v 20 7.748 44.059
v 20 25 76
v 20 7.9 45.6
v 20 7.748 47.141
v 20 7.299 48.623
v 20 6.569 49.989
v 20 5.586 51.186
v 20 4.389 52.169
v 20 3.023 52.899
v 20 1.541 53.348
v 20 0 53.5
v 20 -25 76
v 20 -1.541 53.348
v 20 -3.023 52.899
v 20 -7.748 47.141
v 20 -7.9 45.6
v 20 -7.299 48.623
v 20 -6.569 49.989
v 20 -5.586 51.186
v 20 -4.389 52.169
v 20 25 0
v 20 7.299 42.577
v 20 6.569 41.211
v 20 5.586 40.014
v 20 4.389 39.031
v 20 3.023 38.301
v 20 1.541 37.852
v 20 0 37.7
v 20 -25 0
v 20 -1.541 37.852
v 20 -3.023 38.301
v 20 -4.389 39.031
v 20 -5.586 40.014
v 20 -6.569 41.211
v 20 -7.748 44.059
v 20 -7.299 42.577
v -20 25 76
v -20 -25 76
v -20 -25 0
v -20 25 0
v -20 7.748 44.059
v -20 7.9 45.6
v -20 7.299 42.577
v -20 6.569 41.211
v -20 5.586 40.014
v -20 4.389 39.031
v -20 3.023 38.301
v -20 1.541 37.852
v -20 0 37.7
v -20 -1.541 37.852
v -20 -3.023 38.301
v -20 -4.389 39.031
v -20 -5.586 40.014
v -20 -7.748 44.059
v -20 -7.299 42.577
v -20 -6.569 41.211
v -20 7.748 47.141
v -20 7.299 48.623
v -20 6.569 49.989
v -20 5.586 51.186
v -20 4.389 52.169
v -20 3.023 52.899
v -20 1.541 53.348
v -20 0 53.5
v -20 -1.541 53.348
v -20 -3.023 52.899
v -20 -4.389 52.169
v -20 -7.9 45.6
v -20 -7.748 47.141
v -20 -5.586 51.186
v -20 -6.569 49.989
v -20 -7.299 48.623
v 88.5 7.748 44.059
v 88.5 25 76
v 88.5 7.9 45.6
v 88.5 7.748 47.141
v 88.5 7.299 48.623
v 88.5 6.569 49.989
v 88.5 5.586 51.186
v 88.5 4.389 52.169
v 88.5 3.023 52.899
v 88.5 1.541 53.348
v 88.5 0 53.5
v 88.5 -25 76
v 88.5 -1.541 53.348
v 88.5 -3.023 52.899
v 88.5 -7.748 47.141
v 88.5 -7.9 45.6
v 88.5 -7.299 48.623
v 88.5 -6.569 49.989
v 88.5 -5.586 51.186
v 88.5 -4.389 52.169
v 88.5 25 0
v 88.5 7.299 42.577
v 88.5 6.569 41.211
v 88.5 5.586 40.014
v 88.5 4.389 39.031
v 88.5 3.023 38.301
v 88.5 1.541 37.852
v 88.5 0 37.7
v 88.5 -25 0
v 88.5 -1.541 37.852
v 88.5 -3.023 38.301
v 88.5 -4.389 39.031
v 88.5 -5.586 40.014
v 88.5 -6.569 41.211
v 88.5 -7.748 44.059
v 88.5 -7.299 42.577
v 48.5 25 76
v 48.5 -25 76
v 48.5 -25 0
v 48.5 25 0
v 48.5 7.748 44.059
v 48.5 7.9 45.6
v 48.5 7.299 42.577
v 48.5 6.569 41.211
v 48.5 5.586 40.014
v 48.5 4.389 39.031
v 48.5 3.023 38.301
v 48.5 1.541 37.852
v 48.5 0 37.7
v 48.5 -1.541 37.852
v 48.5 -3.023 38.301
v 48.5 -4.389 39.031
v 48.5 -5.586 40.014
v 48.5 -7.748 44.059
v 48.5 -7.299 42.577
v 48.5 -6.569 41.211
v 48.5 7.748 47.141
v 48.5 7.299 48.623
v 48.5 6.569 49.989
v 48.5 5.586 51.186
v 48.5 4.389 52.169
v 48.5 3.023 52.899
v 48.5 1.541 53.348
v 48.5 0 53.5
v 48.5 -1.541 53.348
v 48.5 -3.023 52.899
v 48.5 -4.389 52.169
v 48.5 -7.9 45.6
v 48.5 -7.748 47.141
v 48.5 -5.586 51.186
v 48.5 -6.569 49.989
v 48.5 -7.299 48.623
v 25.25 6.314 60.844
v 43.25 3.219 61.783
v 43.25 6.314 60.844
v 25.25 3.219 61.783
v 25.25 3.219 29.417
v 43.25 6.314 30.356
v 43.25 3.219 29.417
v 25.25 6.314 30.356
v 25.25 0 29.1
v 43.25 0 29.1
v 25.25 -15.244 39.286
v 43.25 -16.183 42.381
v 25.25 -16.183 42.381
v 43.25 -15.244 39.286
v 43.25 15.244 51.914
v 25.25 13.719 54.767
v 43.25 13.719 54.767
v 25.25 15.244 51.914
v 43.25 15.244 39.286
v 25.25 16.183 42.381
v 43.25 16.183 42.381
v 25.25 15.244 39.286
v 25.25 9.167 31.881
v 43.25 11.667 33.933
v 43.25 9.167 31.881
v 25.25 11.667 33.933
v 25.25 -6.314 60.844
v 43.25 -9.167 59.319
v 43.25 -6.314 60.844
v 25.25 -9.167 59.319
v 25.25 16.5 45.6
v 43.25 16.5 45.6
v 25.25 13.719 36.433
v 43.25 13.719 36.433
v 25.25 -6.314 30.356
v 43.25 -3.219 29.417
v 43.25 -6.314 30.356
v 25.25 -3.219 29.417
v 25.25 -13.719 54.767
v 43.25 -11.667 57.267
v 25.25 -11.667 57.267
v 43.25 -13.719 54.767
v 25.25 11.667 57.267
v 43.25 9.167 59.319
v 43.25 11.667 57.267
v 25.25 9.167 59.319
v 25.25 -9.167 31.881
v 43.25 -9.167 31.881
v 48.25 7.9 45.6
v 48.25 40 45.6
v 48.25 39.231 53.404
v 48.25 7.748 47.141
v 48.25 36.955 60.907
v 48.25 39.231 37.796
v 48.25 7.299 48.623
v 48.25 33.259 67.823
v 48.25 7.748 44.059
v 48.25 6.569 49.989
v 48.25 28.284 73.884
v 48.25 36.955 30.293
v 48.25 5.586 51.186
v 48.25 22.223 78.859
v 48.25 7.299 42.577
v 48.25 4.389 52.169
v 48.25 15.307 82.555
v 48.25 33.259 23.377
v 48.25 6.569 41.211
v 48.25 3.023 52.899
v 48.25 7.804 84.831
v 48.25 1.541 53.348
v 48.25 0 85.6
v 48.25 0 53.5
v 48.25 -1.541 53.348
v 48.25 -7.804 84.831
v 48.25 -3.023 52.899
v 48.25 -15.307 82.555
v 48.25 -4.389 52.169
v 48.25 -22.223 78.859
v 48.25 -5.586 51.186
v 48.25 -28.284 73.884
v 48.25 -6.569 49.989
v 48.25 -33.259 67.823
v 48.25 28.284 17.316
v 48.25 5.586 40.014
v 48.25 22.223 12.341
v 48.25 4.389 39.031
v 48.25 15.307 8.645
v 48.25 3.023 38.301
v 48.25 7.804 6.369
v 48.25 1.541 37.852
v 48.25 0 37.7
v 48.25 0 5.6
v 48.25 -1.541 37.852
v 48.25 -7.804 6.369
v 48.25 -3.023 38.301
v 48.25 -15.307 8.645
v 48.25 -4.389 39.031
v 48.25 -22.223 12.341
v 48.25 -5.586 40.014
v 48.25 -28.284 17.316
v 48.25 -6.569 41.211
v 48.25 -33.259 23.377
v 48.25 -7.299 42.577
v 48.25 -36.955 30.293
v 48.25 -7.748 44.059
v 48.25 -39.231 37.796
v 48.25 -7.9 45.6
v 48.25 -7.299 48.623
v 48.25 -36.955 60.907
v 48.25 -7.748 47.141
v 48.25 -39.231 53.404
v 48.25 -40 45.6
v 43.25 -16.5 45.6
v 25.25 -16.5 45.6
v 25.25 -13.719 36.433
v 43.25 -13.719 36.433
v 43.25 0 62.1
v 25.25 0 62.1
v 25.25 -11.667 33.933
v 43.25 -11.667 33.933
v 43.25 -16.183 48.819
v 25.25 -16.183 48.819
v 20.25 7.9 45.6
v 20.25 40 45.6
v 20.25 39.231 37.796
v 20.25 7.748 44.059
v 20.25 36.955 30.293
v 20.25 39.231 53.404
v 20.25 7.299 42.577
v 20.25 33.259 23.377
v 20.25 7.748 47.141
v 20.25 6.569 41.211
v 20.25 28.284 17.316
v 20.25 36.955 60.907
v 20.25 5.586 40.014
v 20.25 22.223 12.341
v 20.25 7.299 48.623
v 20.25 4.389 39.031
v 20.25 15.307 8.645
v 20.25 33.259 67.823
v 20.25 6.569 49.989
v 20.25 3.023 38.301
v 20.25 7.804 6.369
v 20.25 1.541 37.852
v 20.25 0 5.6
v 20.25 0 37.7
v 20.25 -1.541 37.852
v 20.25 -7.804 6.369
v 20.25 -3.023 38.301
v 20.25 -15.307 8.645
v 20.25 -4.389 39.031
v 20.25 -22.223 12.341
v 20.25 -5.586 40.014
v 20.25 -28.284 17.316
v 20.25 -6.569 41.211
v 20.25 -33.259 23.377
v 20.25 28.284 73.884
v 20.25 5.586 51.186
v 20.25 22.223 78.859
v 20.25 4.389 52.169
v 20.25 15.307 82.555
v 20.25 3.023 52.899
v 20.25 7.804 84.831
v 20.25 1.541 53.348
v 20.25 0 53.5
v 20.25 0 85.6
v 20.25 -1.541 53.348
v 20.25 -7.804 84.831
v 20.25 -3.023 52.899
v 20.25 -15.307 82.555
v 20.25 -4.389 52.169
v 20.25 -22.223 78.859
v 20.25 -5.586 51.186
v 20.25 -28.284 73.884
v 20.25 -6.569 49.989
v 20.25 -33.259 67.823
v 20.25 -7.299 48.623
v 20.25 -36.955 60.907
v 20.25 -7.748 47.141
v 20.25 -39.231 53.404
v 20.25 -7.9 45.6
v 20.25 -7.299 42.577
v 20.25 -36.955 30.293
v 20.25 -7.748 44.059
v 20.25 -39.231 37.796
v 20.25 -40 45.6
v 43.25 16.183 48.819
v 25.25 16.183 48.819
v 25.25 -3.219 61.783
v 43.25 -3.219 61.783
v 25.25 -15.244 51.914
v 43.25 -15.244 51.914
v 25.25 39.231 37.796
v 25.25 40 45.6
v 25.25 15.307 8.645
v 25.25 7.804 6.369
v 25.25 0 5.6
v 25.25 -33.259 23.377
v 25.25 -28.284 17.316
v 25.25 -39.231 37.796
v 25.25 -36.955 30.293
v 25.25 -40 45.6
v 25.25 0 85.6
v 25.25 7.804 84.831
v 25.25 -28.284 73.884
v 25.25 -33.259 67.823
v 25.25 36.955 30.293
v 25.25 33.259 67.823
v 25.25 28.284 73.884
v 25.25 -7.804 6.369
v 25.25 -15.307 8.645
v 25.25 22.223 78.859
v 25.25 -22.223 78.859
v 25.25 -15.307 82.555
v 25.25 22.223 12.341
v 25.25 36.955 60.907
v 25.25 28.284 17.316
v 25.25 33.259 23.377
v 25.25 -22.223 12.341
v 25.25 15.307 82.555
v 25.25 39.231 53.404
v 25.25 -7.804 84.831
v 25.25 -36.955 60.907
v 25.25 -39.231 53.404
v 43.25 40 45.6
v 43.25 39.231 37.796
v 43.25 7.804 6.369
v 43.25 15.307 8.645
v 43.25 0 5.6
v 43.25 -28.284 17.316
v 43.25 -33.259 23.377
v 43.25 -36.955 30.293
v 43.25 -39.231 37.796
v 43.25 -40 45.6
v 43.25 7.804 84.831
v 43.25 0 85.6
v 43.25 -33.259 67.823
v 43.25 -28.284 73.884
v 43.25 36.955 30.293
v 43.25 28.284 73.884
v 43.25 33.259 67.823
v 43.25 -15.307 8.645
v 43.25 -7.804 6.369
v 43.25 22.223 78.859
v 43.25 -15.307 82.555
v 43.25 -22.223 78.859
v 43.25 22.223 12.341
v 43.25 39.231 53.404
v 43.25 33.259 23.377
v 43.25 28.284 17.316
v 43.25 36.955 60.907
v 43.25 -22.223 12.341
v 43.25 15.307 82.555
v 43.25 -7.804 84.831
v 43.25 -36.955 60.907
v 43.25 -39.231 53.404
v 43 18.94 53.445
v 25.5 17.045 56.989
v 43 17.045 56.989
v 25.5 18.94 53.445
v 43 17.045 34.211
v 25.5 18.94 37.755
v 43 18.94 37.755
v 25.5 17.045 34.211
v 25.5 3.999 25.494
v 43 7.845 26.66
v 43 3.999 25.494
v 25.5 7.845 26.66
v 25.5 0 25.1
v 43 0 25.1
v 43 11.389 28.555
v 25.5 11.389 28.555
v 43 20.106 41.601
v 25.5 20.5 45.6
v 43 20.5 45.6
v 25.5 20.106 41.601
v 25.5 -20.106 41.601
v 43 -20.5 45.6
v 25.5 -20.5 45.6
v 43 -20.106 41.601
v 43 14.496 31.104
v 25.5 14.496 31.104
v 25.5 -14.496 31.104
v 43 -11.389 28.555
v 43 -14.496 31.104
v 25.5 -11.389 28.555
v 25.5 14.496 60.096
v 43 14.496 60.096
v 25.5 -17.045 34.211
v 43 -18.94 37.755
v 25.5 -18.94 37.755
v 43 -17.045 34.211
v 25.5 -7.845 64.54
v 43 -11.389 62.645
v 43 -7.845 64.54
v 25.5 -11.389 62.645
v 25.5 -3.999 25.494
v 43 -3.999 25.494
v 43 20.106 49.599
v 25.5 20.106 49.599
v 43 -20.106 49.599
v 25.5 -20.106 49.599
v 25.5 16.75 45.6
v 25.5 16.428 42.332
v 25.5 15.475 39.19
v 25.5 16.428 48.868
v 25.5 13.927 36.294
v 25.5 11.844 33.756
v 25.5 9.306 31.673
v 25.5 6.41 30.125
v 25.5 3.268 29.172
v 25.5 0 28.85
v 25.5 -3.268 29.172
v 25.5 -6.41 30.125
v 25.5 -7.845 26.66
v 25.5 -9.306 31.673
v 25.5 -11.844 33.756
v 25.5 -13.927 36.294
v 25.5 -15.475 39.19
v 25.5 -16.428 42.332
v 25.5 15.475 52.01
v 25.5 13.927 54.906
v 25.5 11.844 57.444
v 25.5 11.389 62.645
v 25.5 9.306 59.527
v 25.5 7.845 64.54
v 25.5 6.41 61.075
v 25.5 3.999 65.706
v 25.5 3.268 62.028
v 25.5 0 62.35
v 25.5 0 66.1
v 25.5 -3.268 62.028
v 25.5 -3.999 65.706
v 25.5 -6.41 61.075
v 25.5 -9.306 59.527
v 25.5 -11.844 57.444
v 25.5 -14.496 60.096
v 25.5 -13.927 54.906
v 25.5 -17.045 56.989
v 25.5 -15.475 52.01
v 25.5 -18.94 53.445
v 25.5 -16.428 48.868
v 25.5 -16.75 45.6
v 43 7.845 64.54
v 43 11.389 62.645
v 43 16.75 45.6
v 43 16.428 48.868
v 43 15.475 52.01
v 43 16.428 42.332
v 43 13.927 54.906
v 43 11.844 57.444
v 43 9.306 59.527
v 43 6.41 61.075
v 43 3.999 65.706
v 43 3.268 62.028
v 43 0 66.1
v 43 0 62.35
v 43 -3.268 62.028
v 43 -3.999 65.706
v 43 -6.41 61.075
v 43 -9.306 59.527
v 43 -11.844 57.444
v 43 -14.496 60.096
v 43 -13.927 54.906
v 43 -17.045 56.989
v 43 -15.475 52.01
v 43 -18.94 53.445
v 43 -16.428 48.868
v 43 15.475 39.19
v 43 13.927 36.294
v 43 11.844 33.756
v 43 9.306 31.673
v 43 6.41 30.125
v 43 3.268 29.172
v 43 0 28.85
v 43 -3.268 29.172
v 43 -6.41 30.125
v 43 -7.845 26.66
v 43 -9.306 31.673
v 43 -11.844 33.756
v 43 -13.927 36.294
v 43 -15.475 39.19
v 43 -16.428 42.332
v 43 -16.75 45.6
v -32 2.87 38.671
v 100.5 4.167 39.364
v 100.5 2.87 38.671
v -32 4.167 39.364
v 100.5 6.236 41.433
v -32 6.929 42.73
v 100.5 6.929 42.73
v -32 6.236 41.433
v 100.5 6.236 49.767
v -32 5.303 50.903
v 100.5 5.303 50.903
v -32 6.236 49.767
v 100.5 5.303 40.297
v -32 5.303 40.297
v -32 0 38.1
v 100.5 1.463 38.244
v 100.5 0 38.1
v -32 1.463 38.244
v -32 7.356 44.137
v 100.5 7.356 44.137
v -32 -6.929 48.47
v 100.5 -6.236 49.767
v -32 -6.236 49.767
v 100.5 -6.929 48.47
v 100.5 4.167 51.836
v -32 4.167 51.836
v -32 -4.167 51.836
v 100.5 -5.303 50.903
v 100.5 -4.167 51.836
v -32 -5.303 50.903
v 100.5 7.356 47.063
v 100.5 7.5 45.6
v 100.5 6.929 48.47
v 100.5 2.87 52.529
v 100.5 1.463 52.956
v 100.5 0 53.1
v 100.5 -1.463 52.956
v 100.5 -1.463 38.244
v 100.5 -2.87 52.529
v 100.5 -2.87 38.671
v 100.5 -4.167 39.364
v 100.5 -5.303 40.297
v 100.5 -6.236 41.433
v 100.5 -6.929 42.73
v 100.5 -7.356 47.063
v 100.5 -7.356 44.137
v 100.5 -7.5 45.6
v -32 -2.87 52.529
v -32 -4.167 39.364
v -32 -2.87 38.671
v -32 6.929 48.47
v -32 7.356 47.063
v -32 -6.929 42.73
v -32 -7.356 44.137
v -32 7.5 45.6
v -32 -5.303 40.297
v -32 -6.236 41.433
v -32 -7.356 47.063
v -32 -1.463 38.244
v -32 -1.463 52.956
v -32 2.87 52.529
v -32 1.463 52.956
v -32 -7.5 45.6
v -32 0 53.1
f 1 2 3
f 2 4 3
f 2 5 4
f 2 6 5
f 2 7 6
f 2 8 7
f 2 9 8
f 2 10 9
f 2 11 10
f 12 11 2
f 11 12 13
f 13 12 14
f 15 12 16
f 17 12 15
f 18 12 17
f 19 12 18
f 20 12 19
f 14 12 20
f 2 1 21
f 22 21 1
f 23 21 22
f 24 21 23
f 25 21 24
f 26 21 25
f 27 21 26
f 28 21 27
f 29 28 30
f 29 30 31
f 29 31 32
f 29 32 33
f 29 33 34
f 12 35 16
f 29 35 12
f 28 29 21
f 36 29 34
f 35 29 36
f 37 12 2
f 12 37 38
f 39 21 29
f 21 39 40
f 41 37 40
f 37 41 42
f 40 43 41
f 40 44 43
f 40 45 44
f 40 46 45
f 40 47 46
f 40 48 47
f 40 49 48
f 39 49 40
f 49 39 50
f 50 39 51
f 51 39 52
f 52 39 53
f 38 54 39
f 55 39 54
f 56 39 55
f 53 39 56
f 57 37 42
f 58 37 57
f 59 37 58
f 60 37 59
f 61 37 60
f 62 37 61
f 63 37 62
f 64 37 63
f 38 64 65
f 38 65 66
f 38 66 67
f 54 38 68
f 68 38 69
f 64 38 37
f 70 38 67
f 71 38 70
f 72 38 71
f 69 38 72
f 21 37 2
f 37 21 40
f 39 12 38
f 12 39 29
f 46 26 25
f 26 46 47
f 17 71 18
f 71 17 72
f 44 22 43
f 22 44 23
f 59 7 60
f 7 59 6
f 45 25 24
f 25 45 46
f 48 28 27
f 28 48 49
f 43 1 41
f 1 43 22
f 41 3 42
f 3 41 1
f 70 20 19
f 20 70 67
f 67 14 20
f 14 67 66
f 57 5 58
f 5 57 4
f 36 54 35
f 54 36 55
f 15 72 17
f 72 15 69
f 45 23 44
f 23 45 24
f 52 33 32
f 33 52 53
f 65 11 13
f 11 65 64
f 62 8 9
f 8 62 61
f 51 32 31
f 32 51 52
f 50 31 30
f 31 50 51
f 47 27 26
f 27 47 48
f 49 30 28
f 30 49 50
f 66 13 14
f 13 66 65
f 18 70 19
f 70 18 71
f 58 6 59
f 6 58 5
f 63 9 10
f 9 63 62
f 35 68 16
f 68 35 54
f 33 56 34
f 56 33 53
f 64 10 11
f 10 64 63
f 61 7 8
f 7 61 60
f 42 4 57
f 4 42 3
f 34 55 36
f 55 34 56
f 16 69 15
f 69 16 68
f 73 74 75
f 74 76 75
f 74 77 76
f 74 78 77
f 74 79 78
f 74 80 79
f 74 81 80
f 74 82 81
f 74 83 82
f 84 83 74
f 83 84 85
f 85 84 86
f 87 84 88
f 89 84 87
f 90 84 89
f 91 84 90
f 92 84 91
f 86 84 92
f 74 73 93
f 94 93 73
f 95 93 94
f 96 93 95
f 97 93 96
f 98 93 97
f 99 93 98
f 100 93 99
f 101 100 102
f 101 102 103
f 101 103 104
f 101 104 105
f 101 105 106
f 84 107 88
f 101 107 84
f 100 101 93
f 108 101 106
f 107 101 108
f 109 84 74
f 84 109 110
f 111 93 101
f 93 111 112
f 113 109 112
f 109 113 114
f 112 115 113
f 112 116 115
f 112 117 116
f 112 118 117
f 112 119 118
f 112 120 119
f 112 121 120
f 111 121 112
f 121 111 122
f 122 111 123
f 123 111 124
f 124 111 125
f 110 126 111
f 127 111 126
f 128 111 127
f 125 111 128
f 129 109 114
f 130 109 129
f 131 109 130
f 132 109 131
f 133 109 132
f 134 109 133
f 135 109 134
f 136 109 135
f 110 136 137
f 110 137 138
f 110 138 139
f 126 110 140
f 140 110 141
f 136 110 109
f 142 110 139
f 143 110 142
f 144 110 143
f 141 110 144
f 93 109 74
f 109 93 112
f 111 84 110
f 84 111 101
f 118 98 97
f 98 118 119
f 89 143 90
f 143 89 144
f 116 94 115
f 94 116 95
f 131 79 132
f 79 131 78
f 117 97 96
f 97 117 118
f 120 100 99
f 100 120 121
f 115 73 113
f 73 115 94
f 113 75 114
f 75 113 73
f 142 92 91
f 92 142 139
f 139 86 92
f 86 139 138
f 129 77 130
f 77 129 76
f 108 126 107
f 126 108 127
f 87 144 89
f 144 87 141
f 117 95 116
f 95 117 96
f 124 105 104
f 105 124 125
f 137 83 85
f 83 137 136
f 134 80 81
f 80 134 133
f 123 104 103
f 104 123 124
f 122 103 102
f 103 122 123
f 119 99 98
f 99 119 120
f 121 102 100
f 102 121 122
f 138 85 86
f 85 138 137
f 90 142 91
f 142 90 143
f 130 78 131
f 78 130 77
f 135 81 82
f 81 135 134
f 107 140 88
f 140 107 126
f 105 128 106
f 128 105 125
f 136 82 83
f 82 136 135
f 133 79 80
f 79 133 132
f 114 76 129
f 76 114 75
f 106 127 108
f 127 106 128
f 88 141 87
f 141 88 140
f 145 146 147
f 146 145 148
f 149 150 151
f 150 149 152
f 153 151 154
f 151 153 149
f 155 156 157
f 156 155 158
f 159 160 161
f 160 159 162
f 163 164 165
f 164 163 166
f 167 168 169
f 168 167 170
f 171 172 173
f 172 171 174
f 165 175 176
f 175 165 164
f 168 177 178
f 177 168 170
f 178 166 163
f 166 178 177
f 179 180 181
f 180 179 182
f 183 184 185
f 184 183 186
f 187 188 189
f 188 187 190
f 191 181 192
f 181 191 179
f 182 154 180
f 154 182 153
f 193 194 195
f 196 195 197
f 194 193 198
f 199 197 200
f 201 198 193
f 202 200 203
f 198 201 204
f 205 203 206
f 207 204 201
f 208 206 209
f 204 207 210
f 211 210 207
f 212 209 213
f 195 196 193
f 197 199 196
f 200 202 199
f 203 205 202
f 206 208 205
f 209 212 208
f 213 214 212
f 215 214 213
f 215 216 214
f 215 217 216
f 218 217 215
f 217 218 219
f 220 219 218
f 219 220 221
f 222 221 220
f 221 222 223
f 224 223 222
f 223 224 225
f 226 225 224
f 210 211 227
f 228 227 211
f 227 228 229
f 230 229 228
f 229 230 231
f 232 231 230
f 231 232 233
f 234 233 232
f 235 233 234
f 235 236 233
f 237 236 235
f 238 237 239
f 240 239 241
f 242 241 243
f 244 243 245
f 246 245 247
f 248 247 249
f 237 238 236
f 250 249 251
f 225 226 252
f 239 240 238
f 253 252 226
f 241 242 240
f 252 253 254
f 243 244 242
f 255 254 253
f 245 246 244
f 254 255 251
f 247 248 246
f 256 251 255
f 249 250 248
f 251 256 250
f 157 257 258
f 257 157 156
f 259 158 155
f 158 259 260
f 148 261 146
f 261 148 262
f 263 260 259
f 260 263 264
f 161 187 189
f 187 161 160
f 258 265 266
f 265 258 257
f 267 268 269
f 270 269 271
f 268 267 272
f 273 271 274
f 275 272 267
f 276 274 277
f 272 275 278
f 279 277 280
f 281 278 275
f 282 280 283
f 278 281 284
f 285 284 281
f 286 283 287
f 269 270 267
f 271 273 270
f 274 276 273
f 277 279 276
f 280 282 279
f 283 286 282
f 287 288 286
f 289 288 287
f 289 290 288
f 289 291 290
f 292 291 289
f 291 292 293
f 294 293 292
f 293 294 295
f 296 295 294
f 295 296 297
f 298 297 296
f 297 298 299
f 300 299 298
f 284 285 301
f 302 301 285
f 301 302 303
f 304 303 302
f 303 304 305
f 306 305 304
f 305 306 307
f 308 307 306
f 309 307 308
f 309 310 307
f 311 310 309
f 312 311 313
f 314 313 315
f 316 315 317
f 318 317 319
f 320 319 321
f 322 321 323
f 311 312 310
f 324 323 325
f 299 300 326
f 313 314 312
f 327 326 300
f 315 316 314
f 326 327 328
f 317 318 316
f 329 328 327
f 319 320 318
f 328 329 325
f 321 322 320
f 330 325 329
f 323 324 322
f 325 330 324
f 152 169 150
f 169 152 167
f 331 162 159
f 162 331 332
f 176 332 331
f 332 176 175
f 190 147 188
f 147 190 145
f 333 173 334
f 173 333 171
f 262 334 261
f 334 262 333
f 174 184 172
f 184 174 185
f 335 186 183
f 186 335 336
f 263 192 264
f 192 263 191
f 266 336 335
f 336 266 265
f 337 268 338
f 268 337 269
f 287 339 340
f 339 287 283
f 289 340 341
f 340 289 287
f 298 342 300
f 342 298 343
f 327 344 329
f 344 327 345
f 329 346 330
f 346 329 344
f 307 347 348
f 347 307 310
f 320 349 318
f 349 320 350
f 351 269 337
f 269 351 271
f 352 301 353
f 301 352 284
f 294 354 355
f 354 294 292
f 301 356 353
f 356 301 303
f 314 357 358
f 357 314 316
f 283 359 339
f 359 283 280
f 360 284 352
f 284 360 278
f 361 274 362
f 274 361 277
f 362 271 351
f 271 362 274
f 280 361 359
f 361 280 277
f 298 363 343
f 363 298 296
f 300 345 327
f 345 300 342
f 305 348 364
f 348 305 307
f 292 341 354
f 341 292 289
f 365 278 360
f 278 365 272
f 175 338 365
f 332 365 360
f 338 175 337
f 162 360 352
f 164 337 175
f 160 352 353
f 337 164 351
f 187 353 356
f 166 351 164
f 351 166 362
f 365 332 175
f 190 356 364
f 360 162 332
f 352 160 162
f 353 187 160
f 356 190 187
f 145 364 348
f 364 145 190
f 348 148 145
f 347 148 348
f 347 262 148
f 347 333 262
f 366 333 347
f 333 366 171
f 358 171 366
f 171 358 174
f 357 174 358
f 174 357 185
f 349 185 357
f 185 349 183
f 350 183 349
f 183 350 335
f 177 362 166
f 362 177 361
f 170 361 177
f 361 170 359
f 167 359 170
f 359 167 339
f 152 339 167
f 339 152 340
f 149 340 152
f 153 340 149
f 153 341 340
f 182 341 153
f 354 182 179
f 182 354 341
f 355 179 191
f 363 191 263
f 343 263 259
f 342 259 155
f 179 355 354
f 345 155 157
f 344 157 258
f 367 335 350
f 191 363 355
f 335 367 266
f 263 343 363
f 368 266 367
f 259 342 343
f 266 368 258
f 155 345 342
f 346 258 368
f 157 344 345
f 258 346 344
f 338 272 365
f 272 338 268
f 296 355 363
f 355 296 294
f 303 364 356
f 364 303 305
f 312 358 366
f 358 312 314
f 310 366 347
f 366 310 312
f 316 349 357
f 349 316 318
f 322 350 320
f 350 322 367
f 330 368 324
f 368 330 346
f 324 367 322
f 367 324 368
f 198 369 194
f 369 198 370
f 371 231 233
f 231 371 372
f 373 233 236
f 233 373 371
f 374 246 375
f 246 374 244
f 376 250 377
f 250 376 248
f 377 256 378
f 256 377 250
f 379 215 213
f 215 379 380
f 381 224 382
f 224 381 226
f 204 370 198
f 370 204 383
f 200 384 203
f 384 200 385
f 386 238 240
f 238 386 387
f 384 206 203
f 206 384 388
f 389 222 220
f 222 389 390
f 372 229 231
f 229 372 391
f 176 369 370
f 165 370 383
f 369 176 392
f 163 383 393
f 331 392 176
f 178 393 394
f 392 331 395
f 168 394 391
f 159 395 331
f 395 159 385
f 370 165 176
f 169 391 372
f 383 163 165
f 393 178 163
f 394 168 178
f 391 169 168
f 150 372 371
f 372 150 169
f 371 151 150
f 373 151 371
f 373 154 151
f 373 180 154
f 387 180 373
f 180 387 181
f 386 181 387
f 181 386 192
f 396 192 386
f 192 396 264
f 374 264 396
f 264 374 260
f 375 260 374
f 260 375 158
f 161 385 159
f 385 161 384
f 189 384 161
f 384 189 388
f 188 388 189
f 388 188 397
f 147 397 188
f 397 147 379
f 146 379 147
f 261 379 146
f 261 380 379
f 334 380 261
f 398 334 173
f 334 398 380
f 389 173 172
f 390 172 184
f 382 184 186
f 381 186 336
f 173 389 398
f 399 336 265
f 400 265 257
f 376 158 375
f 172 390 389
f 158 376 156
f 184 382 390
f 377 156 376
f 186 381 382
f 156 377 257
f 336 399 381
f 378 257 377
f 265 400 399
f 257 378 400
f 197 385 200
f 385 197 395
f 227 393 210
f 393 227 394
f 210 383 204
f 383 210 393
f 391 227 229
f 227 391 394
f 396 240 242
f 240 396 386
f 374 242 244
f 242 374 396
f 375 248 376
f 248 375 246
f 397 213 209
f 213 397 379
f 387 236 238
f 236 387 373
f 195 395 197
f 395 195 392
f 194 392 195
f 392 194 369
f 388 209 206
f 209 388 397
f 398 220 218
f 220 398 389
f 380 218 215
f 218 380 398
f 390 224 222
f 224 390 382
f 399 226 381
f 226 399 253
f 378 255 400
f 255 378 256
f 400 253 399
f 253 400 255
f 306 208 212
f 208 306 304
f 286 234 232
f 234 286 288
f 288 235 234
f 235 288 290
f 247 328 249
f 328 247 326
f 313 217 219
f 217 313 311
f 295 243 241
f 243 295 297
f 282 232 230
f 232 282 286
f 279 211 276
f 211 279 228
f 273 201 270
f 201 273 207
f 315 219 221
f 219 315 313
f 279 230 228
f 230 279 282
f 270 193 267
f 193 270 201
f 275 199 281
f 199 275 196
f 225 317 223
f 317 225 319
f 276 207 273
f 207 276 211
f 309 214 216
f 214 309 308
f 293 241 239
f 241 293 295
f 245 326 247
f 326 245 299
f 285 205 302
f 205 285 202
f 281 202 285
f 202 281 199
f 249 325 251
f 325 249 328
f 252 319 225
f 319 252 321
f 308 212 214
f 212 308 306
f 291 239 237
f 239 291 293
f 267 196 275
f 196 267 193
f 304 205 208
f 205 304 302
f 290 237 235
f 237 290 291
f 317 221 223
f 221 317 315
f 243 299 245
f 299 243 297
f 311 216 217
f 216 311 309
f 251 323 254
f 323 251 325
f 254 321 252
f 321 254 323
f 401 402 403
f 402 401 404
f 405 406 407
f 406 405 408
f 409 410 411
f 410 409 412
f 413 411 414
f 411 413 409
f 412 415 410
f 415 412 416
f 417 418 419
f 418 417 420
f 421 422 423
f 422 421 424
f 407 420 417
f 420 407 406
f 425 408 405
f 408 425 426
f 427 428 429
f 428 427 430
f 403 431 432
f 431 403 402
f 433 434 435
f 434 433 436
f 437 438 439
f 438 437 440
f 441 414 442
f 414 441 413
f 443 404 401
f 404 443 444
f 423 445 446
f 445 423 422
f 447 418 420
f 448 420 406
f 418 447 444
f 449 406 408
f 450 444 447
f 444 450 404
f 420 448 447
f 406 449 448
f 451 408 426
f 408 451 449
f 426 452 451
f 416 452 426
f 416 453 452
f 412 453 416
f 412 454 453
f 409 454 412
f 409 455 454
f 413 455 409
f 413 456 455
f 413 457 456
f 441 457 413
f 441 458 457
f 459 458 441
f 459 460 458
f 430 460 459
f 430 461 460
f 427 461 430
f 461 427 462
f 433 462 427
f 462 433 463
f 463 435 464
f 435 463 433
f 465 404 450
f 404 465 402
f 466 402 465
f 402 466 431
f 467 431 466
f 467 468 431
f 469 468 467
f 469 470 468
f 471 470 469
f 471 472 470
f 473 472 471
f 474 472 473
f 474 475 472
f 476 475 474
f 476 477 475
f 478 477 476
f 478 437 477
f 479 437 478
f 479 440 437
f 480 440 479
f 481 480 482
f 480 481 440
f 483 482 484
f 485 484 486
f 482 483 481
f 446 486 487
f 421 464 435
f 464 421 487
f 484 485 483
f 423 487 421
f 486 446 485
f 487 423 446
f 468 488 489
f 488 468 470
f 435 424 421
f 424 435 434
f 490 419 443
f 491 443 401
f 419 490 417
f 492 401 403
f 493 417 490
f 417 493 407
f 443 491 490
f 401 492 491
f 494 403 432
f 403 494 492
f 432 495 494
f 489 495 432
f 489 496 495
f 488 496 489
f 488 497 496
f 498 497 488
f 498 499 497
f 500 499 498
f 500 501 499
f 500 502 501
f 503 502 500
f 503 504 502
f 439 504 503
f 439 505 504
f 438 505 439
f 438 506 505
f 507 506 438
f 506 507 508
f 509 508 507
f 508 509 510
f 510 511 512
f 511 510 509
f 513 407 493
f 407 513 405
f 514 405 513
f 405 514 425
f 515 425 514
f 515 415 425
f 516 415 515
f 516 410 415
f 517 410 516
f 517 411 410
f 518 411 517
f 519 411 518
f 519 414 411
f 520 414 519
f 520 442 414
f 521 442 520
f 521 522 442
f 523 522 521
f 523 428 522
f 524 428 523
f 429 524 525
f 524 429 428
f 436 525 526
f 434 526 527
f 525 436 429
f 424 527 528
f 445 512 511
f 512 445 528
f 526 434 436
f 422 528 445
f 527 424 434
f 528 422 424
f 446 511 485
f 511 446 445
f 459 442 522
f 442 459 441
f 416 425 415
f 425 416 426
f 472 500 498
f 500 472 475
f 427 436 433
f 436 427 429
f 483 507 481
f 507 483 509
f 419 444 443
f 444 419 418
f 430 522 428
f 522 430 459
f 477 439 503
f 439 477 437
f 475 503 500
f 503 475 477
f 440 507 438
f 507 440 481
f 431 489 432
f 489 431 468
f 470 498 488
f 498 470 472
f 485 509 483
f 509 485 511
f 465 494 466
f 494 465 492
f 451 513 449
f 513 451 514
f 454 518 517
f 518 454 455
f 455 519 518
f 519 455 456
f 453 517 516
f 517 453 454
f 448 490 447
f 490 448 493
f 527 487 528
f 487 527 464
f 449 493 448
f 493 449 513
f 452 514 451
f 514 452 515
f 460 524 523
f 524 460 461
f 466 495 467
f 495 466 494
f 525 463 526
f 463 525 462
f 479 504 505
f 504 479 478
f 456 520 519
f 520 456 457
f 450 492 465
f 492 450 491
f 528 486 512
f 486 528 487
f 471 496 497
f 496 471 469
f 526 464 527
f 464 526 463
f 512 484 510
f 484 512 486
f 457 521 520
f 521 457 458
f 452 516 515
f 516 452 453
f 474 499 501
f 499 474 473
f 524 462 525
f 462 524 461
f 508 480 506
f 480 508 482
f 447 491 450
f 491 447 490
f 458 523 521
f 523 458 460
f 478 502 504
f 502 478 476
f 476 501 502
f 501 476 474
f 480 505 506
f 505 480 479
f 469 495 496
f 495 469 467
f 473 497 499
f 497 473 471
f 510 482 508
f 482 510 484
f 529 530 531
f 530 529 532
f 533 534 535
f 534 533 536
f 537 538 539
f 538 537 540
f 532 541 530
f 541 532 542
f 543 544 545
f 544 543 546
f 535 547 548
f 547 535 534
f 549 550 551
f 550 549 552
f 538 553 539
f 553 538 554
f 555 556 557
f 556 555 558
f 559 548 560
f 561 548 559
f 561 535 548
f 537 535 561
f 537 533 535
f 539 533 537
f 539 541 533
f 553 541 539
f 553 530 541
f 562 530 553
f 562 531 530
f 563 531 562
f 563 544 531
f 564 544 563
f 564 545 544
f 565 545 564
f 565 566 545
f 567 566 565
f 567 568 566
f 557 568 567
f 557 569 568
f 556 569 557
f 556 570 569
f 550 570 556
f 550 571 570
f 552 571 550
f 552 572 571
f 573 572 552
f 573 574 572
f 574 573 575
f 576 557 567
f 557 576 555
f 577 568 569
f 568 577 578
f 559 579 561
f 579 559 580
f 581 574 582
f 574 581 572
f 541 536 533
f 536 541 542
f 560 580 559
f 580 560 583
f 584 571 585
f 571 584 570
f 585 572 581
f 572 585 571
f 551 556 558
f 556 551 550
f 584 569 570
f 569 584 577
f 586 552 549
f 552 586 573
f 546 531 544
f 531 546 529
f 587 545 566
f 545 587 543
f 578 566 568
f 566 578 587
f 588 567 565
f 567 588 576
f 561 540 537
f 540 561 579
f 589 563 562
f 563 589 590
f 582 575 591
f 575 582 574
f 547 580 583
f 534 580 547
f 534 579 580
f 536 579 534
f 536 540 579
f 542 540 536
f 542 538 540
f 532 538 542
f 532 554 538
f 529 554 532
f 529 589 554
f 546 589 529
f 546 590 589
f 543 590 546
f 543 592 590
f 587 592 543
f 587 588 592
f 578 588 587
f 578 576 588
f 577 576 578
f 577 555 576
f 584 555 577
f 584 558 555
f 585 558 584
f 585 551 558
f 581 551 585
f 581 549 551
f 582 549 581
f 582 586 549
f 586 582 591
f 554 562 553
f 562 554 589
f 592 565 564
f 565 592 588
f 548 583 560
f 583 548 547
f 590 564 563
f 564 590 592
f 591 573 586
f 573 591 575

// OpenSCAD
$fn = 32;

// ------------------------------------------------------------------------
// Pulley assembly: d80 pulley with a belt, shaft d15
// Every part is its own module, assembly() places them once.
// ------------------------------------------------------------------------

// --- part 1 ---
module support1() {
  difference() {
    translate([-20, -25, 0]) cube([40, 50, 76]);
    translate([0, 0, 45.6]) rotate([0, 90, 0]) cylinder(h = 42, d = 15.8, center = true);
  }
}

// --- part 2 ---
module support2() {
  difference() {
    translate([-20, -25, 0]) cube([40, 50, 76]);
    translate([0, 0, 45.6]) rotate([0, 90, 0]) cylinder(h = 42, d = 15.8, center = true);
  }
}

// --- part 3 ---
module shaft() {
  translate([0, 0, -66.25]) cylinder(h = 132.5, d = 15);
}

// --- part 4 ---
module pulley() {
  difference() {
    union() {
      cylinder(h = 28, d = 33);
      cylinder(h = 5, d = 80);
      translate([0, 0, 23]) cylinder(h = 5, d = 80);
    }
    translate([0, 0, -1]) cylinder(h = 30, d = 15.8);
  }
}

// --- part 5 ---
module belt() {
  difference() {
      translate([0, 0, 0]) cylinder(h = 17.5, d = 41);
      translate([0, 0, -1]) cylinder(h = 19.5, d = 33.5);
    }
}

// --- assembly ---
module assembly() {
  translate([0, 0, 0]) rotate([0, 0, 0]) support1();
  translate([68.5, 0, 0]) rotate([0, 0, 0]) support2();
  translate([34.25, 0, 45.6]) rotate([0, 90, 0]) shaft();
  translate([20.25, 0, 45.6]) rotate([0, 90, 0]) pulley();
  translate([25.5, 0, 45.6]) rotate([0, 90, 0]) belt();
}

assembly();
